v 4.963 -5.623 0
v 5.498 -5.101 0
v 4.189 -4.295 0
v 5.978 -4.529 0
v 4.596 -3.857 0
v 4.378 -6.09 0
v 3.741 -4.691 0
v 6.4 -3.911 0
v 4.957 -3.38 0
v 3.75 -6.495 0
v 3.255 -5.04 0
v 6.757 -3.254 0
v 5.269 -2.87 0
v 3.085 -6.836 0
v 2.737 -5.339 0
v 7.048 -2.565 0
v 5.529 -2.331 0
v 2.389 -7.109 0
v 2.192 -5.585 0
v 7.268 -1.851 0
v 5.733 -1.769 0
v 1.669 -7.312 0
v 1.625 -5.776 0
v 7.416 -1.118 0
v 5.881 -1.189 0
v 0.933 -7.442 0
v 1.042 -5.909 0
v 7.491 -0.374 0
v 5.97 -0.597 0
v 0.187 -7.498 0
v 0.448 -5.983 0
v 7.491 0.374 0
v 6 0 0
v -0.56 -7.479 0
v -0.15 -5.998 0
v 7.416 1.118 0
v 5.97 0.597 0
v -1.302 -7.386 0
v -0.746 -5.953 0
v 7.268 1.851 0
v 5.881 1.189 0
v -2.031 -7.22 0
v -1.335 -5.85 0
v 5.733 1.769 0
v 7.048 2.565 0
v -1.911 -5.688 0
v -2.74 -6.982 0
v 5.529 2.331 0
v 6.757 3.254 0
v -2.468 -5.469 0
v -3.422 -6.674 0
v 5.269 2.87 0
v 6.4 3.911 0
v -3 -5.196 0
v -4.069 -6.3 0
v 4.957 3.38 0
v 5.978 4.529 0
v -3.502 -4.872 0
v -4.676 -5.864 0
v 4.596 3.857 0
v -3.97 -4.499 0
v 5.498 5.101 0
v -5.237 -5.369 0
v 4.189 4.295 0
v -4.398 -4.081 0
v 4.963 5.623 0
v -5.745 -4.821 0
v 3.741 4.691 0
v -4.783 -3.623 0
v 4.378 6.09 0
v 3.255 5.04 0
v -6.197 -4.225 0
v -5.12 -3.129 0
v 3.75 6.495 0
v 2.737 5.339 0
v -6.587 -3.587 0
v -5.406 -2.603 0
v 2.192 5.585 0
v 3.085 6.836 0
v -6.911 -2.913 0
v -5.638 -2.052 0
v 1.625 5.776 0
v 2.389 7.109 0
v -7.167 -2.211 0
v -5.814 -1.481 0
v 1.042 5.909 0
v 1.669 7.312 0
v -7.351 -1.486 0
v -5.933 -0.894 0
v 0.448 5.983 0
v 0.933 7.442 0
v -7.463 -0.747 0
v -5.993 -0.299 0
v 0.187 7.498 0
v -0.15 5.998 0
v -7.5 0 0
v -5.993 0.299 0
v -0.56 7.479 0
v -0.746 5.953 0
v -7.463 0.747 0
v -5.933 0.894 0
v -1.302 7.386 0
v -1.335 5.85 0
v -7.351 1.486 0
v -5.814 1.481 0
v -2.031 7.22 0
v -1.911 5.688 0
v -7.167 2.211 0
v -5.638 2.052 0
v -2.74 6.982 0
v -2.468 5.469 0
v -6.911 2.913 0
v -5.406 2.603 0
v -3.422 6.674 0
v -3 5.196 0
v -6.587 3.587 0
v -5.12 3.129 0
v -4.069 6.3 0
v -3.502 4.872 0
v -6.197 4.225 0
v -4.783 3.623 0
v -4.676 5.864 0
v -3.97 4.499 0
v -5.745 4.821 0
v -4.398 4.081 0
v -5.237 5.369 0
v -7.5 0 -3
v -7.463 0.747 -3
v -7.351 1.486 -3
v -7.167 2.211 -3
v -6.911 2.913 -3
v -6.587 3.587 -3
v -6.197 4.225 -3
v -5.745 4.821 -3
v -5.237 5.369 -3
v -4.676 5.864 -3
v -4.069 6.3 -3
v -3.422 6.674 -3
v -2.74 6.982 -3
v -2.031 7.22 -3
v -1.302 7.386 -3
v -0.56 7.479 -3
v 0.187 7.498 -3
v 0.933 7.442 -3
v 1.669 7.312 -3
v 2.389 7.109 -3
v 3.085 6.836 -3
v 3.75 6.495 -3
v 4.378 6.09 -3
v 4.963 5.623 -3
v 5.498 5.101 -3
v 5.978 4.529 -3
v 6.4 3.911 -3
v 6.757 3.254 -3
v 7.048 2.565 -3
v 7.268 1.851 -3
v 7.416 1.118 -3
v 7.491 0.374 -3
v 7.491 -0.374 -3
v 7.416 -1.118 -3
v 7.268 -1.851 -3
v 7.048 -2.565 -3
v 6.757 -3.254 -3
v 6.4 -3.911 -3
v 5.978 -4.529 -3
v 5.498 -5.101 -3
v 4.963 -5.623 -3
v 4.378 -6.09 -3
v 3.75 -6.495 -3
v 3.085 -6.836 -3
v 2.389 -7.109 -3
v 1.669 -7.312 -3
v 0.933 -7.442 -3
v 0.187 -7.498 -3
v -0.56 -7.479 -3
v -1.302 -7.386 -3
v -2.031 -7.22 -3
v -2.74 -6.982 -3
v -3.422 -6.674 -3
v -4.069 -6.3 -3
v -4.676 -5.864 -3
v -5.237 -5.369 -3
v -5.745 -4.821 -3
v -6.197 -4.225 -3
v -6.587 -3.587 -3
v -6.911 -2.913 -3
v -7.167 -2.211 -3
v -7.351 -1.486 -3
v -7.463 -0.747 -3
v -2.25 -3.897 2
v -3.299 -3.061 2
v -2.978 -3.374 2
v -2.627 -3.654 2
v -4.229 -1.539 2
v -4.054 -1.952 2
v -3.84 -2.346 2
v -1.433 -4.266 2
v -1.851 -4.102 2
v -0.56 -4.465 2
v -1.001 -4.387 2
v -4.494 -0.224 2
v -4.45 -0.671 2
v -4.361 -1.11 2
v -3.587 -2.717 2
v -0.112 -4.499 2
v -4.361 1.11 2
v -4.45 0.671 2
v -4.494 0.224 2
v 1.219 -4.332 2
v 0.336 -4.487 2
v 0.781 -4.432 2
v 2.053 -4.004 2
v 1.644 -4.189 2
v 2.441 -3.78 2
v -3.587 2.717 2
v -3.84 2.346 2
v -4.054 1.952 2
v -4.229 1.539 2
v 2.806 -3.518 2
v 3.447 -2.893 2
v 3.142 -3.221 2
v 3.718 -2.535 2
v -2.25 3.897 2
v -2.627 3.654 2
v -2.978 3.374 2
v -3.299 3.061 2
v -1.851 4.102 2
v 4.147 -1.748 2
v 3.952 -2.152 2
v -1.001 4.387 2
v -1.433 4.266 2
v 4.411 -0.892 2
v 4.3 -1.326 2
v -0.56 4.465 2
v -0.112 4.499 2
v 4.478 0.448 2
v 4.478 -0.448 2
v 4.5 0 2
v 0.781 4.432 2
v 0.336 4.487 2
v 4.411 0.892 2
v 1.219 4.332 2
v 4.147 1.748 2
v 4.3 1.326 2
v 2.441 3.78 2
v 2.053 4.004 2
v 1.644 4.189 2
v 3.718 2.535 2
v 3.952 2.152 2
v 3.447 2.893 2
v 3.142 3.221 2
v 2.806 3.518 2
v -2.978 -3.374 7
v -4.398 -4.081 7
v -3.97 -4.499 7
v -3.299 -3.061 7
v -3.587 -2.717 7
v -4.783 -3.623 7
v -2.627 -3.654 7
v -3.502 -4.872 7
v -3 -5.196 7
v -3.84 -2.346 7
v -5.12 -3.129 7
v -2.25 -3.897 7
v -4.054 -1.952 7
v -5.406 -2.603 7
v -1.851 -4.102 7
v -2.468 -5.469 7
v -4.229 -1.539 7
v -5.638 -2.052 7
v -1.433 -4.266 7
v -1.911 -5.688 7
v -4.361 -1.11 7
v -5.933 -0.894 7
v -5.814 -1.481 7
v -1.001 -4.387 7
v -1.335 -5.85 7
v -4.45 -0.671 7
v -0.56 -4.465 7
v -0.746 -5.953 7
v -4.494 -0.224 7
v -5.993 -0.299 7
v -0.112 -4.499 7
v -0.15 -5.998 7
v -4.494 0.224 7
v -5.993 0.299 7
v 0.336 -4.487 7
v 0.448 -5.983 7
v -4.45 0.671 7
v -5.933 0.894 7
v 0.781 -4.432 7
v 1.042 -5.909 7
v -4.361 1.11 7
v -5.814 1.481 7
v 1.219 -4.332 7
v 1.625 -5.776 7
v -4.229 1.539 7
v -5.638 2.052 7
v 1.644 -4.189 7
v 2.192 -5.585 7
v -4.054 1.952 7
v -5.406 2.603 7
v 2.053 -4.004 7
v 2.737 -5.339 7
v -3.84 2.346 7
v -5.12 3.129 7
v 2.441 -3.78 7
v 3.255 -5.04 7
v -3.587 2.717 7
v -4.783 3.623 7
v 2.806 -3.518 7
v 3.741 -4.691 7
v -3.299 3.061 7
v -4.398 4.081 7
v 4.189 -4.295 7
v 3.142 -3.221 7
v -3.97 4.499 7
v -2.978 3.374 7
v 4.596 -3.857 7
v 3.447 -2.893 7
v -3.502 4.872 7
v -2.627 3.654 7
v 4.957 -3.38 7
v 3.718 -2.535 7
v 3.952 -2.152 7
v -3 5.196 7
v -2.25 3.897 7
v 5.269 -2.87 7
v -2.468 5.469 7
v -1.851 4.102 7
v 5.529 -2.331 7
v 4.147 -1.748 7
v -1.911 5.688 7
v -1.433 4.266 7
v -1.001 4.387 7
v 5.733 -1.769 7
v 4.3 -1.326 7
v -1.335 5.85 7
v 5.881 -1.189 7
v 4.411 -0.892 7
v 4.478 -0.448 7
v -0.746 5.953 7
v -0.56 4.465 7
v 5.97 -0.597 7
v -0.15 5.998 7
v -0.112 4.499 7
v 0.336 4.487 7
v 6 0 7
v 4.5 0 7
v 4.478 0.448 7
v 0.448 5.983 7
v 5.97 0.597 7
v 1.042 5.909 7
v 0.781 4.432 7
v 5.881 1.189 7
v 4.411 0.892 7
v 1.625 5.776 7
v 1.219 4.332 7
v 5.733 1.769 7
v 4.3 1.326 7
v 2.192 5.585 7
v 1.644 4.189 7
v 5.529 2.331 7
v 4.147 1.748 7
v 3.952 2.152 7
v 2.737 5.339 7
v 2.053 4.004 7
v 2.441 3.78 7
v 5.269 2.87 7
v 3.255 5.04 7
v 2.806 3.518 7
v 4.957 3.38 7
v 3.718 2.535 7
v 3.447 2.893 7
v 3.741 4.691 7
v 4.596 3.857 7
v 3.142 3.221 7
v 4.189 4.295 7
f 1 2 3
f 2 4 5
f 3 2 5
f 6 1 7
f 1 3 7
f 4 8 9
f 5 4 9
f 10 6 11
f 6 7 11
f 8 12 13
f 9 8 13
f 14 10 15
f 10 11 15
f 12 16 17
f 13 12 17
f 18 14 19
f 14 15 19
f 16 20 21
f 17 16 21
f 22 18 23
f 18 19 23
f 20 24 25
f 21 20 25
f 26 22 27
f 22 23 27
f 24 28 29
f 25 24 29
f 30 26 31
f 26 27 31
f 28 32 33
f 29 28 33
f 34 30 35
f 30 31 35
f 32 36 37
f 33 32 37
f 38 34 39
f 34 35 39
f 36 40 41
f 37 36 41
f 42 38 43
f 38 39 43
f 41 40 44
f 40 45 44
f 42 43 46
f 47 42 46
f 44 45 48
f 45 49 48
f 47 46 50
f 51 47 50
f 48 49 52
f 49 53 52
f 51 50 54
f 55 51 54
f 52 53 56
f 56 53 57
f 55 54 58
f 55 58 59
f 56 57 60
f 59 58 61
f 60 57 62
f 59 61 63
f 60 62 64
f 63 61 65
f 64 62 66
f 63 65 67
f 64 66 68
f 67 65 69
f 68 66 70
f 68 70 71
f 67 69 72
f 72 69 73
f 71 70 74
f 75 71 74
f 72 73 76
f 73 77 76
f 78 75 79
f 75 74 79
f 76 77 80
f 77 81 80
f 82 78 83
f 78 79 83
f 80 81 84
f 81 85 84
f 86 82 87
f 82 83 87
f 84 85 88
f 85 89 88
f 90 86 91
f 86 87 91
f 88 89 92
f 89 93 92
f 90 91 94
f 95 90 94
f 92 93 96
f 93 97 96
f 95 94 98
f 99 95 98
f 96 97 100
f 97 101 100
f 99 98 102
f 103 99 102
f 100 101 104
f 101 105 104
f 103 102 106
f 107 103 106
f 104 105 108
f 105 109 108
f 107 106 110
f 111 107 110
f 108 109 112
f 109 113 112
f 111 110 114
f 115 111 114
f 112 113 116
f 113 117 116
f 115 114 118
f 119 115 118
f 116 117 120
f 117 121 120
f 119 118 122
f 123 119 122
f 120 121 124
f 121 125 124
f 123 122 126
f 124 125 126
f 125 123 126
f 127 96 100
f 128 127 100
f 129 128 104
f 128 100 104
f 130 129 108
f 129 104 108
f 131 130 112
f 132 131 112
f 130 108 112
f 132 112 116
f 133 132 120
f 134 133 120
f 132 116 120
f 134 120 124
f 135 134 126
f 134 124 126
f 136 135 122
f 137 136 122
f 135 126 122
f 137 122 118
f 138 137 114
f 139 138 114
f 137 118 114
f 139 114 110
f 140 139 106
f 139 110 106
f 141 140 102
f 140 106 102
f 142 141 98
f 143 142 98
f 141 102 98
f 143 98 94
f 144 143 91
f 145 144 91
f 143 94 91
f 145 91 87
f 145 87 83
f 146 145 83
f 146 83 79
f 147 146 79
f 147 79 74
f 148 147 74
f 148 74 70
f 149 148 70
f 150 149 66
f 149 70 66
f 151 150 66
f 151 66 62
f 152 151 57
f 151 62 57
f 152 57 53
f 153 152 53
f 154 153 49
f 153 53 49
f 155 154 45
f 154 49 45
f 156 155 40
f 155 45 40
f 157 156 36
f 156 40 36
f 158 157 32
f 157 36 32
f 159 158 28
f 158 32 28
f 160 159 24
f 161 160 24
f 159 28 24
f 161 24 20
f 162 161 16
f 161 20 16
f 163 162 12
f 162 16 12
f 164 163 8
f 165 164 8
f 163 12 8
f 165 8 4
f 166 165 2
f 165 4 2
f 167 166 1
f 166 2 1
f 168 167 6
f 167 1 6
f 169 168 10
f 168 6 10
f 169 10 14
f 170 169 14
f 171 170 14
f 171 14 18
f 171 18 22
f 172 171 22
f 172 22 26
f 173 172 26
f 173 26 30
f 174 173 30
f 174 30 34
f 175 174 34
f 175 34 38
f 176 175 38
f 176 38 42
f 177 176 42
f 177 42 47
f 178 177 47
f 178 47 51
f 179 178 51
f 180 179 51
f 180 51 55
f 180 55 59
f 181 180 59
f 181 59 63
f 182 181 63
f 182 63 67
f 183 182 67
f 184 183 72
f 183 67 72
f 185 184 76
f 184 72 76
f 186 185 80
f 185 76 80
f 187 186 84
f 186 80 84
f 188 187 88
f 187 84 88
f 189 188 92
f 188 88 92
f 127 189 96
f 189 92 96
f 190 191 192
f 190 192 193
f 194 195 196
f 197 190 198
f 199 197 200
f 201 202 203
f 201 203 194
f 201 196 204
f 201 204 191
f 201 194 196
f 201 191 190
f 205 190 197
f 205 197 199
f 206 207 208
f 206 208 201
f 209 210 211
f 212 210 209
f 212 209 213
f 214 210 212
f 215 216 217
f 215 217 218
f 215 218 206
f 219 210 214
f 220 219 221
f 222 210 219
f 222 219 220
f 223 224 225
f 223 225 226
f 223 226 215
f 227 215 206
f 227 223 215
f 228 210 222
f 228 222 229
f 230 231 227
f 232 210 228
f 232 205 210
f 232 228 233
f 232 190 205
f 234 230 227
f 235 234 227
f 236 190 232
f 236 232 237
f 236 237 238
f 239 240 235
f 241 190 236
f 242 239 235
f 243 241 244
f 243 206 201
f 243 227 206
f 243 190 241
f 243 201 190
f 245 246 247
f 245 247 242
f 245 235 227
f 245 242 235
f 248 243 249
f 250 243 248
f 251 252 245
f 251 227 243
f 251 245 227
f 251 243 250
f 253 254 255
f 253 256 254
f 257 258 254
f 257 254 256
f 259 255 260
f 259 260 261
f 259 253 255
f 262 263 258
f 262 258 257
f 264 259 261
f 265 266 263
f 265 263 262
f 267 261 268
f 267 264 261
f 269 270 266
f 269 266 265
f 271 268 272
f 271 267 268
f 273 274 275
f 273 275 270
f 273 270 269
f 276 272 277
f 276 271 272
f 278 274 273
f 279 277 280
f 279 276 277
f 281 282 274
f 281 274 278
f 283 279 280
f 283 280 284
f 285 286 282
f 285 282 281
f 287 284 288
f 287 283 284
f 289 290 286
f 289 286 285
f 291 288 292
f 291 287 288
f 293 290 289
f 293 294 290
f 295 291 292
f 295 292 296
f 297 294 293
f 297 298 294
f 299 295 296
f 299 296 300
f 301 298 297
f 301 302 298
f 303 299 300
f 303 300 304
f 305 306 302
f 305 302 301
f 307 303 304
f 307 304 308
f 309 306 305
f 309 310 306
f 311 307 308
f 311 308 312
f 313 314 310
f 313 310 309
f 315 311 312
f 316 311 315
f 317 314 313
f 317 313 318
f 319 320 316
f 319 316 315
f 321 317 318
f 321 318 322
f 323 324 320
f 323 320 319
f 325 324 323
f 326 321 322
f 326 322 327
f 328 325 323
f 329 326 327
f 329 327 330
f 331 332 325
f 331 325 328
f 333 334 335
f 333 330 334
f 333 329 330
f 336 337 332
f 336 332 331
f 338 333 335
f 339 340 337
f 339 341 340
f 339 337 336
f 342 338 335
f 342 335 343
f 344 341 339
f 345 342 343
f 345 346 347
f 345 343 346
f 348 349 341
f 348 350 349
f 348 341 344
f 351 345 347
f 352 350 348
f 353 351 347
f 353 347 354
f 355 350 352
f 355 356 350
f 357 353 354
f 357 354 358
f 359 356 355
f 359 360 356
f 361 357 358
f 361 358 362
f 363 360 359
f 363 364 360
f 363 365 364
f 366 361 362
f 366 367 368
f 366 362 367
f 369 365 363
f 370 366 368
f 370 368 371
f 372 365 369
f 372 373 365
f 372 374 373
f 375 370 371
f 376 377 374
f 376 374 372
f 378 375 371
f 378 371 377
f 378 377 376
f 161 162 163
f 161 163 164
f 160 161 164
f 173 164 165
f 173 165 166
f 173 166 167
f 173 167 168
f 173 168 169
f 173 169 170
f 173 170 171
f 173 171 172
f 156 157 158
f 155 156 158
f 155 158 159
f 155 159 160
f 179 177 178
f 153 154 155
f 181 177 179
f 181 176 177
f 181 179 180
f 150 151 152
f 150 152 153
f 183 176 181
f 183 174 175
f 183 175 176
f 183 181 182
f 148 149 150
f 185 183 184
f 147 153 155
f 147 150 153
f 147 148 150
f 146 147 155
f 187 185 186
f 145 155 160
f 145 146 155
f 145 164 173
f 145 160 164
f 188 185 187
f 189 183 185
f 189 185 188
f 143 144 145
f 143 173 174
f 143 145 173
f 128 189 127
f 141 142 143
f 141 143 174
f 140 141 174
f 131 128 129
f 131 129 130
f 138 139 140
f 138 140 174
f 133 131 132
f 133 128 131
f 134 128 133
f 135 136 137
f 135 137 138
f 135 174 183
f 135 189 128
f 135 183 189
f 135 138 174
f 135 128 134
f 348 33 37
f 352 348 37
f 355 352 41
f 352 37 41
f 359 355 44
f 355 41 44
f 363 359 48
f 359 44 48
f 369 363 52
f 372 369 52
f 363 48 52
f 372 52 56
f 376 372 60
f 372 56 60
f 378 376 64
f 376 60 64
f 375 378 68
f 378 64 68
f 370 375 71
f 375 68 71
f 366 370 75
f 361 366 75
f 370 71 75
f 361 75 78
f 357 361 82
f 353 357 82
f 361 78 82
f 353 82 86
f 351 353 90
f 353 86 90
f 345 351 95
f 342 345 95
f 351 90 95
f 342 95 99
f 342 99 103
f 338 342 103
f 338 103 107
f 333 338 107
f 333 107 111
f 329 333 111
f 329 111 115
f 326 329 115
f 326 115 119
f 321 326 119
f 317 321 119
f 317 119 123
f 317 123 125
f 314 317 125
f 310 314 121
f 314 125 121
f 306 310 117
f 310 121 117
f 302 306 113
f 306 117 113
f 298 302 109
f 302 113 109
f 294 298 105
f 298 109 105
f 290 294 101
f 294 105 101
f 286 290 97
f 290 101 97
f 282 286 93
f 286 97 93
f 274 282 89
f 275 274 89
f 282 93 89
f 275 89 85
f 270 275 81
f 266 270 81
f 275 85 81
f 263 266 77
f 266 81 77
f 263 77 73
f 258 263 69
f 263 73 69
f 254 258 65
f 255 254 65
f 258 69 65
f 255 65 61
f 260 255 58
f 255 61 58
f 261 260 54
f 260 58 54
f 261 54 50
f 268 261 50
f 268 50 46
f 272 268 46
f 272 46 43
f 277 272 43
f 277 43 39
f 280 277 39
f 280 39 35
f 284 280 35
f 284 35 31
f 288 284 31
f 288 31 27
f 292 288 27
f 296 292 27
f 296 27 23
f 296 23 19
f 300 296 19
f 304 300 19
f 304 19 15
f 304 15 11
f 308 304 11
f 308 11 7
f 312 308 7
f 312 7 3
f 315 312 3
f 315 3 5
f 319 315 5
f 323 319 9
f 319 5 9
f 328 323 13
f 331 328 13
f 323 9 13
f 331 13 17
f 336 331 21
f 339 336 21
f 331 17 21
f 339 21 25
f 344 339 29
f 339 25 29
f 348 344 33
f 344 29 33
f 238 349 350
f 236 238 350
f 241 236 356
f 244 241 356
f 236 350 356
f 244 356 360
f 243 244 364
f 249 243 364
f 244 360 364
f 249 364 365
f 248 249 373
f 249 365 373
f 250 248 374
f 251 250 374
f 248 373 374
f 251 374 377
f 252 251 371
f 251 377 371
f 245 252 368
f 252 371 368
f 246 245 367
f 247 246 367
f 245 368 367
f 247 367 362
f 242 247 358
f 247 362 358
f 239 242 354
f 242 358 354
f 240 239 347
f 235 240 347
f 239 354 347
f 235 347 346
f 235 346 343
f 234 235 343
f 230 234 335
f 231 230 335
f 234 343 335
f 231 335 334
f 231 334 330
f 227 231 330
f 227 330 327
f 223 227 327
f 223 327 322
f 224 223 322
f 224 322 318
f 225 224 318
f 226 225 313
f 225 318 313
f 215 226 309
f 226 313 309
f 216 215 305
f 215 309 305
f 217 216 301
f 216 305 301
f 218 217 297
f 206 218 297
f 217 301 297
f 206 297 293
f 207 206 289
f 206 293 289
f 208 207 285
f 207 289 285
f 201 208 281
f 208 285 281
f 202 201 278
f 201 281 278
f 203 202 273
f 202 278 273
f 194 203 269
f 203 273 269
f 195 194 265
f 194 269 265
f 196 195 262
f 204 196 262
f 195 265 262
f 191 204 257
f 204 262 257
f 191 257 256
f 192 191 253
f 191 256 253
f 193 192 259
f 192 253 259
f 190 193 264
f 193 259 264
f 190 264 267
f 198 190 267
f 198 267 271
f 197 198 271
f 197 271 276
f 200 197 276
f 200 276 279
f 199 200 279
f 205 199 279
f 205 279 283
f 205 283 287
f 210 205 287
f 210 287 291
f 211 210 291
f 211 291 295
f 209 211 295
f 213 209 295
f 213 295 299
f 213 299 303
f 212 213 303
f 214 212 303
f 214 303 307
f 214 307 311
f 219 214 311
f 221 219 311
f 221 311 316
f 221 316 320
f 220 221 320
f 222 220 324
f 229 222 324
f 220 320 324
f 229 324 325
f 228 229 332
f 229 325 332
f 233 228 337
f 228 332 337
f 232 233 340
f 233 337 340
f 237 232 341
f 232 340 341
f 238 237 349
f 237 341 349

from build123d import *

# Parameters (mm, degrees)
SCHIZZO1_R                   = 6
ESTRUSIONE_ESTRUSIONE1_DEPTH = 7
SCHIZZO2_R                   = 4.5
TAGLIO_ESTRUSIONE1_DEPTH     = 5
SCHIZZO3_R                   = 7.5
ESTRUSIONE_ESTRUSIONE2_DEPTH = 3


with BuildPart() as part:
    # Schizzo1 → Estrusione-Estrusione1 (new body)
    with BuildSketch(Plane.XY):
        Circle(SCHIZZO1_R)
    extrude(amount=ESTRUSIONE_ESTRUSIONE1_DEPTH)

    # Schizzo2 → Taglio-Estrusione1 (cut)
    with BuildSketch(Plane.XY.offset(7)):
        Circle(SCHIZZO2_R)
    extrude(amount=-TAGLIO_ESTRUSIONE1_DEPTH, mode=Mode.SUBTRACT)

    # Schizzo3 → Estrusione-Estrusione2 (add)
    with BuildSketch(Plane(origin=(0, 0, 0), x_dir=(-1, 0, 0), z_dir=(0, 0, -1))):
        Circle(SCHIZZO3_R)
    extrude(amount=ESTRUSIONE_ESTRUSIONE2_DEPTH)


solid = part.part
